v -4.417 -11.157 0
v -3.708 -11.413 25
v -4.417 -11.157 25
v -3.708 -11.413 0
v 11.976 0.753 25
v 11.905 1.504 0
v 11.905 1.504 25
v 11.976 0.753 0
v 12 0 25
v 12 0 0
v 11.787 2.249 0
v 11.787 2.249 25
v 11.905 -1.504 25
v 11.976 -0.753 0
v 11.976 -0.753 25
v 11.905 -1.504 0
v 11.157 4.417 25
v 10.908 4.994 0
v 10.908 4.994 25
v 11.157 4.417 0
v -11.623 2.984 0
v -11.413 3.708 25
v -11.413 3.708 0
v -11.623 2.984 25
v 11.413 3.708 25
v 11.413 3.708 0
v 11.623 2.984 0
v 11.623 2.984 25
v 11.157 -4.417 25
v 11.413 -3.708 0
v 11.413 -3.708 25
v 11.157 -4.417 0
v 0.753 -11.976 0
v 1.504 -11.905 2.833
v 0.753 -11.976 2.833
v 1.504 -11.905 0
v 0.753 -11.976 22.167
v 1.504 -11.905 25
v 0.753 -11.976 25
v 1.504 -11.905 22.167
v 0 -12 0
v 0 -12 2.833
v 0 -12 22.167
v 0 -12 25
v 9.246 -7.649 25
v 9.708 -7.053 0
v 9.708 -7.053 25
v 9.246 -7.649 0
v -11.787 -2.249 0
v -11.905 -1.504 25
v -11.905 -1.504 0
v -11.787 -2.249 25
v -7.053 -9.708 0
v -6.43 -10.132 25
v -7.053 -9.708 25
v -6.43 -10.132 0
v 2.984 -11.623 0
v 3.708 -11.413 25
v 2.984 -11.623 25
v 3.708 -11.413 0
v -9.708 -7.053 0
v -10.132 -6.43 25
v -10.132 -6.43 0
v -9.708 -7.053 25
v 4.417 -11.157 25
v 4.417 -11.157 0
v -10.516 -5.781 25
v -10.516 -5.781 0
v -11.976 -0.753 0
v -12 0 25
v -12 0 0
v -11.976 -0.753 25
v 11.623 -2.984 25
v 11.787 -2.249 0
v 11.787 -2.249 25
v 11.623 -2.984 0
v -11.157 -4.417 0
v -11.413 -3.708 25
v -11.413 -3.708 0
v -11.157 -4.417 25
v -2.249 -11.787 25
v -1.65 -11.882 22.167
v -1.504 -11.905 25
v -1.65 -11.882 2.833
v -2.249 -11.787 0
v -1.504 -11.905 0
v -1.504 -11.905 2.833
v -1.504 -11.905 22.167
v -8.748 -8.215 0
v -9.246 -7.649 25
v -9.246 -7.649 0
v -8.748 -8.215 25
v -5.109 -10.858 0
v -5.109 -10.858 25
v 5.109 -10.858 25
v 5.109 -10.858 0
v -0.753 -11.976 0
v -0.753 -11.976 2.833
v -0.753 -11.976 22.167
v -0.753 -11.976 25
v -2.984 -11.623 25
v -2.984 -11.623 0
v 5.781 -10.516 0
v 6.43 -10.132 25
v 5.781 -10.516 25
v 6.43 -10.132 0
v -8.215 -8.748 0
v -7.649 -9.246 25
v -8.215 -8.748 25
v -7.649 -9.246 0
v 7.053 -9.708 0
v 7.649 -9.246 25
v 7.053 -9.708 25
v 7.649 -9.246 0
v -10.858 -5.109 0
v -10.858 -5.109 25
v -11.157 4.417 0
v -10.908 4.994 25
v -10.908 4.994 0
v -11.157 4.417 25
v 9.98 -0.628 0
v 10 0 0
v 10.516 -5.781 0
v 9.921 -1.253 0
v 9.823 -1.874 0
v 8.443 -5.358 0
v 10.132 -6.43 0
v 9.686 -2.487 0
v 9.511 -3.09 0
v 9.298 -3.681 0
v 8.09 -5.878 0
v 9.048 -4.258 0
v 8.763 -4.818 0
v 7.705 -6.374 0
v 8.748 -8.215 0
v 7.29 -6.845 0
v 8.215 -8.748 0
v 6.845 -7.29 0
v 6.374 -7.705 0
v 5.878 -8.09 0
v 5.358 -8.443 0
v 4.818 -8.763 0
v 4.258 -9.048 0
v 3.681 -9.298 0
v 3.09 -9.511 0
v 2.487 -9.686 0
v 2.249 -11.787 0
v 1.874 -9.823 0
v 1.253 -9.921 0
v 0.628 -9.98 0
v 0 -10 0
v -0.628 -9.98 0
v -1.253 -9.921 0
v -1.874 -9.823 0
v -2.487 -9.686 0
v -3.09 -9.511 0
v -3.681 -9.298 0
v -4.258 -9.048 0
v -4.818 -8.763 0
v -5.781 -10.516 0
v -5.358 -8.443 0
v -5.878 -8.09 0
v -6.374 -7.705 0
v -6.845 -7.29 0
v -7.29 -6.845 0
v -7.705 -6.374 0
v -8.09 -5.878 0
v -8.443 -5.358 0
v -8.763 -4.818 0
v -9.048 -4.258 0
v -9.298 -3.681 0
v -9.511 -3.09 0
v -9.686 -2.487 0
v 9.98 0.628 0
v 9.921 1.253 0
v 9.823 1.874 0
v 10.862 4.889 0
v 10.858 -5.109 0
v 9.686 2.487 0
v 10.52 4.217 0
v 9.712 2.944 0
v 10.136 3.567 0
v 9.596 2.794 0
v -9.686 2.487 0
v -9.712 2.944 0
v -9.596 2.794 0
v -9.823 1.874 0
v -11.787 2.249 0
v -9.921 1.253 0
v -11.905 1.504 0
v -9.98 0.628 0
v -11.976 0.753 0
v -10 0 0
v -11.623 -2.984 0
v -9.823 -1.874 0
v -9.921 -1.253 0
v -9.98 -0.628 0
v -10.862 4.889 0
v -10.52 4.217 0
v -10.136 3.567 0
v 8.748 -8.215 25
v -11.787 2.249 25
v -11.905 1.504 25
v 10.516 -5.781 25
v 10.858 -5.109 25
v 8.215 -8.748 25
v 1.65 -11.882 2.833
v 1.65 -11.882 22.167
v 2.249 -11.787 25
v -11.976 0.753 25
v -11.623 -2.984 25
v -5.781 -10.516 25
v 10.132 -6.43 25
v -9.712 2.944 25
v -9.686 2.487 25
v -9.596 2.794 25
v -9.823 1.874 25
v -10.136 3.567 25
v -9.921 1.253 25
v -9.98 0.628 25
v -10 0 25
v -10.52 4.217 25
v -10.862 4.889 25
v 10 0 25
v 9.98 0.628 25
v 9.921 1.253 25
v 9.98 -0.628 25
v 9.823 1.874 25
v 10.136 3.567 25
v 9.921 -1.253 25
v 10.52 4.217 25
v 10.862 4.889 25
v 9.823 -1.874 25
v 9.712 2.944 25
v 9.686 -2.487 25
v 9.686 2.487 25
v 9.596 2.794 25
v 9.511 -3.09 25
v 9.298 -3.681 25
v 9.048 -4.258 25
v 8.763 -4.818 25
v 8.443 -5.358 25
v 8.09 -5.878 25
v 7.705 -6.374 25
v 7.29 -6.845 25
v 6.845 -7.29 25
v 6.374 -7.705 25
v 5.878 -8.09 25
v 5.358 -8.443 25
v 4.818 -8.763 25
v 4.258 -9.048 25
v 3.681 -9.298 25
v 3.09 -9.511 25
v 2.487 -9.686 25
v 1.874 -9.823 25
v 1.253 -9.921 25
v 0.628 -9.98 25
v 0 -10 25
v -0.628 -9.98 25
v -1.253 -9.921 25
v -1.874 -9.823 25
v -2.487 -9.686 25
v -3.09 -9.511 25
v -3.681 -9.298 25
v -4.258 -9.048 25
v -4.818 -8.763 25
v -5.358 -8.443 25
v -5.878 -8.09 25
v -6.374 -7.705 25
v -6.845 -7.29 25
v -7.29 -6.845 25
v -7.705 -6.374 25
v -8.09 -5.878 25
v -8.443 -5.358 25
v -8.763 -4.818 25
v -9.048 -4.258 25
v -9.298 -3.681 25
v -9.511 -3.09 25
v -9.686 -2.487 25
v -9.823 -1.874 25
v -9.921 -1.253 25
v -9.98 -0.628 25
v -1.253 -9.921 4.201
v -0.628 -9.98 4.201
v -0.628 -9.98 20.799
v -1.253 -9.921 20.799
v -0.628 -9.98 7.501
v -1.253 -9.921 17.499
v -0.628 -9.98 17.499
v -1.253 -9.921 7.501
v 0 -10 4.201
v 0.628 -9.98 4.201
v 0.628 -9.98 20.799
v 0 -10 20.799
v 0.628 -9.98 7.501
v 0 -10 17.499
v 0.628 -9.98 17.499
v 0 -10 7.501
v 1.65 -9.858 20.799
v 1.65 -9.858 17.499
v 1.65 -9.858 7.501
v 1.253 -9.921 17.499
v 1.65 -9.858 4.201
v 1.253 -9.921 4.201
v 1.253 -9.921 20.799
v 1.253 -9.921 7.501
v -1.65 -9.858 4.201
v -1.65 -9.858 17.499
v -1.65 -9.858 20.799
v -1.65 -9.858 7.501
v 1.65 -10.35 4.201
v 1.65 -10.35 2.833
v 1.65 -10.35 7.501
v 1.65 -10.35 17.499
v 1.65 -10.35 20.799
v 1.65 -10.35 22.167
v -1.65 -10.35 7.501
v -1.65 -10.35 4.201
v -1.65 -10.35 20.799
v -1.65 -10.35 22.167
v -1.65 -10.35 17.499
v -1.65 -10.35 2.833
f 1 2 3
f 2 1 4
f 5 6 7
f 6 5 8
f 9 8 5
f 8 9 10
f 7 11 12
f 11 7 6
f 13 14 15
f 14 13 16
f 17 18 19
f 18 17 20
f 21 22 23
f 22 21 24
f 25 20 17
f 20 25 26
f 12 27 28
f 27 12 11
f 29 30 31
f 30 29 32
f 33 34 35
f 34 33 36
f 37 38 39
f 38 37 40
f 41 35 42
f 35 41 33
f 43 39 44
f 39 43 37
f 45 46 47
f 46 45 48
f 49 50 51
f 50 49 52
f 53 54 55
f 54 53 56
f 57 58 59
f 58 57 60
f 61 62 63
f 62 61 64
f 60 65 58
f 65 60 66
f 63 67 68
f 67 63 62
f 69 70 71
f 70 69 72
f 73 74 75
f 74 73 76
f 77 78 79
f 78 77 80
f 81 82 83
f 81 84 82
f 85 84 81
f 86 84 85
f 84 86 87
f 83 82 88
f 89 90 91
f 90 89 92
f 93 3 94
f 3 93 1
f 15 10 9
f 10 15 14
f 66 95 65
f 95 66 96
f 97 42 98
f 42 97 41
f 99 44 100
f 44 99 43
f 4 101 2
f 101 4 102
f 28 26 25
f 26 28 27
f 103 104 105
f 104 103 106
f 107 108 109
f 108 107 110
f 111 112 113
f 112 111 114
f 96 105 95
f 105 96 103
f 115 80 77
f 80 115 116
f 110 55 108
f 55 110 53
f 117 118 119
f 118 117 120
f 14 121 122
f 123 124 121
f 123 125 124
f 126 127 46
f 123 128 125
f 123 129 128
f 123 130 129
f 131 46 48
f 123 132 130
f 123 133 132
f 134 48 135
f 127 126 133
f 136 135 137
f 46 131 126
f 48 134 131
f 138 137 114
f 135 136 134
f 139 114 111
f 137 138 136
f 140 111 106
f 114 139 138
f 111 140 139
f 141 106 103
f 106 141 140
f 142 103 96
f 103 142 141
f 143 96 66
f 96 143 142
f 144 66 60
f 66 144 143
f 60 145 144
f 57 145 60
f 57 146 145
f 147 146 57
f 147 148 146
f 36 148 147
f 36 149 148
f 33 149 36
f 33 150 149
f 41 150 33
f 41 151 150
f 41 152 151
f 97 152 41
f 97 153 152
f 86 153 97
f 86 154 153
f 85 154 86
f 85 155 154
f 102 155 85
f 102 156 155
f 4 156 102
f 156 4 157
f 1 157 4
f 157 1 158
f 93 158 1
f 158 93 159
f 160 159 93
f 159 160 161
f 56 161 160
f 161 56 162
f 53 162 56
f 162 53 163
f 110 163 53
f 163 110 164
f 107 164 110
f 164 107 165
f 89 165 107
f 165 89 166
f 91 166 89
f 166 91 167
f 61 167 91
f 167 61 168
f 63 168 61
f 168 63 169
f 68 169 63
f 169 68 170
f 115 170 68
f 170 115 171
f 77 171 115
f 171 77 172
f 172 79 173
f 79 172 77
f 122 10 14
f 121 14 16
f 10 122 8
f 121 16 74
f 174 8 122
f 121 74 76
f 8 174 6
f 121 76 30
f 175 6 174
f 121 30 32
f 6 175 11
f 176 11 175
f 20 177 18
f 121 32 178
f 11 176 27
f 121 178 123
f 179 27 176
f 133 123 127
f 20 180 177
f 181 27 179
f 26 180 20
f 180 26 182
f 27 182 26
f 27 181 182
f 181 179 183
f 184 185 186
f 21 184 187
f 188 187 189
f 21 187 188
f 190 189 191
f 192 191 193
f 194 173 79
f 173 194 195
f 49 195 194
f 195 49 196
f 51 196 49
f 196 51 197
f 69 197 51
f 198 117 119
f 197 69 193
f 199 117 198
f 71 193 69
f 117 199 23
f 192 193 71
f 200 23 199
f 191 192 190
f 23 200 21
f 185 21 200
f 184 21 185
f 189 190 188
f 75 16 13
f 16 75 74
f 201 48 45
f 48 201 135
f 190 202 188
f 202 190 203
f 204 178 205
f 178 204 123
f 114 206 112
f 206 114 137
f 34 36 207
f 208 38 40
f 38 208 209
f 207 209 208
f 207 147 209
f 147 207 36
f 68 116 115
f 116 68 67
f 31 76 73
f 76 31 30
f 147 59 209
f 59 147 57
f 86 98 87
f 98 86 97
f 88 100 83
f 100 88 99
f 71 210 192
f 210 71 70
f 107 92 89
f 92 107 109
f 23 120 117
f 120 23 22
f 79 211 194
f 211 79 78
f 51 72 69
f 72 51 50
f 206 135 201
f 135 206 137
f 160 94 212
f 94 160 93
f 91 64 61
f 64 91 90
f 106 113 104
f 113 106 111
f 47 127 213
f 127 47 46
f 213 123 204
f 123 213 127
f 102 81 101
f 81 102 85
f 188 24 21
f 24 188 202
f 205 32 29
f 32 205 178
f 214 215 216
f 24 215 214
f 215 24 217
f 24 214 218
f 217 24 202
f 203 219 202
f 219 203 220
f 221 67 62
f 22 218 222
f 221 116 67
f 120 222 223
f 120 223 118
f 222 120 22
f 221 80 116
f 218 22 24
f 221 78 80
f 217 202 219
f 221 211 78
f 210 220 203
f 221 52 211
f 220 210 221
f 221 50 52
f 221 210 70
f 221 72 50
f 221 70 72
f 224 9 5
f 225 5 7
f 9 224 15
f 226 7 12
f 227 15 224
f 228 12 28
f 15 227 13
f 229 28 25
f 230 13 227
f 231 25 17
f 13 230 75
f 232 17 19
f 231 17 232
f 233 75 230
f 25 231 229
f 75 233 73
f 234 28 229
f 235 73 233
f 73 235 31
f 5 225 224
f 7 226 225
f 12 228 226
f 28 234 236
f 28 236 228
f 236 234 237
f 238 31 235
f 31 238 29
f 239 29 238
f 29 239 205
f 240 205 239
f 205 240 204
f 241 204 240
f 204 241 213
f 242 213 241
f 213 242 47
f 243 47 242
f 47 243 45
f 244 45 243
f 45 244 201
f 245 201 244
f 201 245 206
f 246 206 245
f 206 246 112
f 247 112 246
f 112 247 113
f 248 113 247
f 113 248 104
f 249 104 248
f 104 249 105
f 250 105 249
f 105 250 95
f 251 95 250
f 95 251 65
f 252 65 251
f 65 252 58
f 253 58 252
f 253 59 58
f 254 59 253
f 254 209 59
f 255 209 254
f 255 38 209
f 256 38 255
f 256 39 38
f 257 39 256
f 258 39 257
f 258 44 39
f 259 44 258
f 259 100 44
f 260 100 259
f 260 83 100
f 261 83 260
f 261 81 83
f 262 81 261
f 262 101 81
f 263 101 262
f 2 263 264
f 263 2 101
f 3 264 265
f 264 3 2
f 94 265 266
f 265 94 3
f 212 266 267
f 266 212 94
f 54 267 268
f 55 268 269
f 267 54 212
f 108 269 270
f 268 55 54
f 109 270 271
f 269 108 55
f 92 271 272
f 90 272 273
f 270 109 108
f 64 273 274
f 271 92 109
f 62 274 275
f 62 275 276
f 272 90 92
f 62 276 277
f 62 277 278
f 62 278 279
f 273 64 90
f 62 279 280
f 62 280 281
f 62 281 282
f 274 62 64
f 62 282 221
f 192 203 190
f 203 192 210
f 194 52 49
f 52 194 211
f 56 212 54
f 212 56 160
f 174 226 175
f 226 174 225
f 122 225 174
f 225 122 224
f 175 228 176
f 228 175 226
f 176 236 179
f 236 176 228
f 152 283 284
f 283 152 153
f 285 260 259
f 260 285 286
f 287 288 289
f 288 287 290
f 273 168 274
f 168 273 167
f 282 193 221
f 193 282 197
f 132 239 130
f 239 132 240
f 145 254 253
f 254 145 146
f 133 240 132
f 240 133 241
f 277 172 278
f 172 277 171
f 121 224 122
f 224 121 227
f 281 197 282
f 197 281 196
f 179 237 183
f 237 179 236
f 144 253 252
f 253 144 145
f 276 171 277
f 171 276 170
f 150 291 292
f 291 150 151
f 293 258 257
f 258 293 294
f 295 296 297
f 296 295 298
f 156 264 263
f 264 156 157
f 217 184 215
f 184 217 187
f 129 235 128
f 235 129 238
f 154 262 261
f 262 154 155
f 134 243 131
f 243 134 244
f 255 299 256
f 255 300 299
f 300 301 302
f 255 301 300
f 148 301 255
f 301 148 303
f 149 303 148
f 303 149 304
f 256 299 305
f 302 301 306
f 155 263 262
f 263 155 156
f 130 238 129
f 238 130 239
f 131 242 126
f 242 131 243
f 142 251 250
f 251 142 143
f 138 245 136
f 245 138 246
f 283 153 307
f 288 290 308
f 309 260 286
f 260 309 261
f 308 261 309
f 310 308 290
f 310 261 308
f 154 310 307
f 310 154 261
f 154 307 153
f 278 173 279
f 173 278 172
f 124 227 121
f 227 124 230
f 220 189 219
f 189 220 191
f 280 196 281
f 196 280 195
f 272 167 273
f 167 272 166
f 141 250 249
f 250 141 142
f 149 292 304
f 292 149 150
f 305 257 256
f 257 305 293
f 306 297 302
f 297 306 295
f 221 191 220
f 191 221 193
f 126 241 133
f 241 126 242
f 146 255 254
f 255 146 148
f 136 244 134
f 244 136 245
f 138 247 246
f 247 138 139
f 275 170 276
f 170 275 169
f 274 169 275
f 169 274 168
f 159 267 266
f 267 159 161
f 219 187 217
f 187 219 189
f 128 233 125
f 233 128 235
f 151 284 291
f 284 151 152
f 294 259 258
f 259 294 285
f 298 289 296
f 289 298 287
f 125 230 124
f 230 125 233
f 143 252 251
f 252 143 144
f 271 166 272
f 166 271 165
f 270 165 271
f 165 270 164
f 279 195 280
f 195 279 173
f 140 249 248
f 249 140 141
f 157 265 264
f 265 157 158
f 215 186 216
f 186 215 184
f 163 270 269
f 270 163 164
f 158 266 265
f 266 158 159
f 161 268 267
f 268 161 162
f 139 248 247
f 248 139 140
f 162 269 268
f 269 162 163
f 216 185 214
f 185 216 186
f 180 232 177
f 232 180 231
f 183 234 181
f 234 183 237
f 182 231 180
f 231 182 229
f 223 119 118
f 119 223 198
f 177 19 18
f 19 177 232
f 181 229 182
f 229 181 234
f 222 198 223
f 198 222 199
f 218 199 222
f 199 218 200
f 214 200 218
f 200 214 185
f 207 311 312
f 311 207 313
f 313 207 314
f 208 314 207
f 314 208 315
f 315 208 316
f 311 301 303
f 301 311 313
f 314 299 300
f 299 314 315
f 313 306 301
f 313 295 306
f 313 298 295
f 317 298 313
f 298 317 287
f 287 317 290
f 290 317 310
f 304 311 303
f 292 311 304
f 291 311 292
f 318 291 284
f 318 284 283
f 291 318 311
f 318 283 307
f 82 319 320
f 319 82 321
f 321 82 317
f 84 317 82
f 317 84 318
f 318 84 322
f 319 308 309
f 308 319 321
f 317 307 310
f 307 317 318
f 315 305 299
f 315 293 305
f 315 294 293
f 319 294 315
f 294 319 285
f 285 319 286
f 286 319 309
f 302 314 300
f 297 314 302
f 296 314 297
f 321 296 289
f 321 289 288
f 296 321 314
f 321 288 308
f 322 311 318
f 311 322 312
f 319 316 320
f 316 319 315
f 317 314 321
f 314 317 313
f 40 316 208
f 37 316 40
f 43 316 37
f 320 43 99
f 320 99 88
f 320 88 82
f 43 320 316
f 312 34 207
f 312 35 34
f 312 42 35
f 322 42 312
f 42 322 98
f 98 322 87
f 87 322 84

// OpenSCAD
wandstaerke=2;
rohrdicke=20;
epsilon=0.01;
cliplaenge=25;
lochabstand=10;
lochdurchmesser=3;
lochdurchmesser_intended=lochdurchmesser*1.4142*1.1;

difference(){
    cylinder(d=rohrdicke+2*wandstaerke, h=cliplaenge,$fn=100);
    translate([0,0,-epsilon])
    cylinder(d=rohrdicke, h=cliplaenge+2*epsilon,$fn=100);
    translate([0,10,-epsilon])
    cylinder(d=rohrdicke+2*wandstaerke+epsilon, h=cliplaenge+2*epsilon,$fn=100);
    translate([0,0,cliplaenge/2-lochabstand/2-lochdurchmesser_intended/2.83])
        rotate([90,45,0])
            cylinder(d=lochdurchmesser_intended,h=20,$fn=4);
    translate([0,0,cliplaenge/2+lochabstand/2+lochdurchmesser_intended/2.83])
        rotate([90,45,0])
            cylinder(d=lochdurchmesser_intended,h=20,$fn=4);
    translate([0,-12,cliplaenge/2-lochabstand/2-lochdurchmesser_intended])
        rotate([0,0,45])
            cylinder(d=lochdurchmesser_intended,$fn=4,h=lochabstand+2*lochdurchmesser_intended);
}

//rotate([97,0,0])
//translate([0,30,4])
//scale([3,3,3])
//import("Dolphin.stl");
//130
